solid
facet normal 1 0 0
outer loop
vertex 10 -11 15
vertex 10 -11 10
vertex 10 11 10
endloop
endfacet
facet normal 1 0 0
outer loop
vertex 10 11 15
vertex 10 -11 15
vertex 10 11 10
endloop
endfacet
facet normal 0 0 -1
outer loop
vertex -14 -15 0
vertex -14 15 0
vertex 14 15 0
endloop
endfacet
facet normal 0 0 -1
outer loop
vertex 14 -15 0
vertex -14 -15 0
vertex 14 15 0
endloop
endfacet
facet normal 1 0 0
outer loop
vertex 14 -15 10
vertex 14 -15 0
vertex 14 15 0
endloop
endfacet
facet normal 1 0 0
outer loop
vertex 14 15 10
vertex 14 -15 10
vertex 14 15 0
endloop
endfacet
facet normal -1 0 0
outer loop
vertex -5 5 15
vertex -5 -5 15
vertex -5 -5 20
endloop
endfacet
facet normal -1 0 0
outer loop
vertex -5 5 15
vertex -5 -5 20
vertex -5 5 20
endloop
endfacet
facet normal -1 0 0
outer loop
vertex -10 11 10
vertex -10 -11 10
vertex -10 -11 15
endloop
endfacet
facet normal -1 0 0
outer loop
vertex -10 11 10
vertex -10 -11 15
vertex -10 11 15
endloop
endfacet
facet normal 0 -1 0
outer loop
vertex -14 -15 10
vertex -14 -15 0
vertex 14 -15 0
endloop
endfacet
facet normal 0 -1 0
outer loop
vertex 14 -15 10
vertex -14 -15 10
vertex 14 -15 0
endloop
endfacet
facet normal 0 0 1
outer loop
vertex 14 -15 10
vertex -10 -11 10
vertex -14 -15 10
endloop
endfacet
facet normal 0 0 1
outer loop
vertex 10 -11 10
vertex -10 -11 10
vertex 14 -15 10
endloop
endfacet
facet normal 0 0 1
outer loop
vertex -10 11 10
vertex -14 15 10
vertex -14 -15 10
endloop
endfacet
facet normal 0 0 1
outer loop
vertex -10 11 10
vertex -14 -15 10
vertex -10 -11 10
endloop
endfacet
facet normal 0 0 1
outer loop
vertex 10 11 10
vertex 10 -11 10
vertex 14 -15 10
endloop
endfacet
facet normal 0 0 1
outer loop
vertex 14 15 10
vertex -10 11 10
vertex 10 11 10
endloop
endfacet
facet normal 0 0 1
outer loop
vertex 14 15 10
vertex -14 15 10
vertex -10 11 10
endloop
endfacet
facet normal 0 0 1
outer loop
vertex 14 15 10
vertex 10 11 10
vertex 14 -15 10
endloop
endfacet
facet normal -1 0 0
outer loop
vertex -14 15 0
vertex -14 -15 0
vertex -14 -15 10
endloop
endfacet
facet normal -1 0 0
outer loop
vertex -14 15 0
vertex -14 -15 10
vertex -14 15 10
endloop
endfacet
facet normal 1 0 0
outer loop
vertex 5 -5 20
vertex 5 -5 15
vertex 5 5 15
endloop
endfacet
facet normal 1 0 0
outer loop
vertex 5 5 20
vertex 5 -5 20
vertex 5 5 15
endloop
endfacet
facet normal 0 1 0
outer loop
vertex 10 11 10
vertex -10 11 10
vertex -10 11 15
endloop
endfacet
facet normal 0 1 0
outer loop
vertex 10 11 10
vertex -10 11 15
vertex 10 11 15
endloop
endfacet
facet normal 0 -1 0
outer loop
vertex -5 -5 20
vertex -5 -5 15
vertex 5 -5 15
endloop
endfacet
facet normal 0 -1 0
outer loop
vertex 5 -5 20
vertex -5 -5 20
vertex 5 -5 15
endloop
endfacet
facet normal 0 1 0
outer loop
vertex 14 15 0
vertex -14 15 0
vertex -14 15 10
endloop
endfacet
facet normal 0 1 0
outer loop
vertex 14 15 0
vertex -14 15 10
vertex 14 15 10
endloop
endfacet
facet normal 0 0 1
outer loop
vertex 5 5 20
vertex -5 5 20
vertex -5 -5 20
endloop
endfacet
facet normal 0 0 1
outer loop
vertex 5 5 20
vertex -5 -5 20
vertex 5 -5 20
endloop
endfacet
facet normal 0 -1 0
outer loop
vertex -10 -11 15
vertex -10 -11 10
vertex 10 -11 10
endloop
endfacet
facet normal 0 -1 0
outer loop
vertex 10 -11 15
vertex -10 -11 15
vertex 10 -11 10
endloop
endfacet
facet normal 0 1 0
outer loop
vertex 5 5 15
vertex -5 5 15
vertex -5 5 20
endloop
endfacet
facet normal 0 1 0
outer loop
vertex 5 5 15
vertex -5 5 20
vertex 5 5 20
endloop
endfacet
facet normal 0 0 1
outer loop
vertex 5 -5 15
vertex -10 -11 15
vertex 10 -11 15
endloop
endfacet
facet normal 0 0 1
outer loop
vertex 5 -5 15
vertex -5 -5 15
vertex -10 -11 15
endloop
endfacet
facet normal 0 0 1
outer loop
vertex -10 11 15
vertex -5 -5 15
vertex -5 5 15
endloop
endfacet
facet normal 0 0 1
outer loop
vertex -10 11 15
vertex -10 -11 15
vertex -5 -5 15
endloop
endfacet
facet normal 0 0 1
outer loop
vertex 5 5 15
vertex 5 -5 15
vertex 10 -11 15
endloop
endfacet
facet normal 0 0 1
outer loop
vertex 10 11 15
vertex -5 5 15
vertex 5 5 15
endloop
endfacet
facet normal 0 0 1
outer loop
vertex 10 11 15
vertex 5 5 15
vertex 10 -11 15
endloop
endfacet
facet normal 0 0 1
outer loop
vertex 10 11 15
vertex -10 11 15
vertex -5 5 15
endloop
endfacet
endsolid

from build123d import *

# Parameters (mm, degrees)
F0_W     = 28
F0_H     = 30
F0_W_2   = 20
F0_H_2   = 22
F1_DEPTH = 10
F2_DEPTH = 15
F3_W     = 10
F3_H     = 10
F4_DEPTH = 5


with BuildPart() as f1:
    # F0 (on Top) → F1 (new body)
    with BuildSketch(Plane.XY):
        Rectangle(F0_W, F0_H)
        Rectangle(F0_W_2, F0_H_2, mode=Mode.SUBTRACT)
    extrude(amount=F1_DEPTH)

    # F0 (on Top) → F2 (join)
    with BuildSketch(Plane.XY):
        Rectangle(F0_W_2, F0_H_2)
    extrude(amount=F2_DEPTH)

    # F3 (on face) → F4 (join)
    with BuildSketch(Plane.XY.offset(15)):
        Rectangle(F3_W, F3_H)
    extrude(amount=F4_DEPTH)


solid = f1.part
